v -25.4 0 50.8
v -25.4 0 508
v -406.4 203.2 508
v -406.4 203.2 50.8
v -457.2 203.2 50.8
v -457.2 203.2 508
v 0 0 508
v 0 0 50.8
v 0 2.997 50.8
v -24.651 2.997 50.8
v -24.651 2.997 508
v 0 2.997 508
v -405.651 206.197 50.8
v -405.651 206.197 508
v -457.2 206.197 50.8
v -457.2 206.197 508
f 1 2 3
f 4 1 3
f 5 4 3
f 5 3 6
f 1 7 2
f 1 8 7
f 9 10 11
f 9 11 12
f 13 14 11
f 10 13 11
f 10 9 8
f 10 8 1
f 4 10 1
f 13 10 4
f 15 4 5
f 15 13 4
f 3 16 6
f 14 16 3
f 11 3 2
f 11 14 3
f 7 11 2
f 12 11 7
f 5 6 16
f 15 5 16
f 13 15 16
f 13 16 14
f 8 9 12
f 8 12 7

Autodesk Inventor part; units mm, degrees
ref_plane "YZ Plane" through (0, 0, 0) normal (1, 0, 0) x (0, 1, 0)
ref_plane "XZ Plane" through (0, 0, 0) normal (0, 1, 0) x (-1, 0, 0)
ref_plane "XY Plane" through (0, 0, 0) normal (0, 0, 1) x (1, 0, 0)
sketch "Sketch1" plane through (0, 0, 0) normal (0, 0, 1) x (1, 0, 0)
  line L0 (0, 0) -> (-25.4, 0)
  line L1 (-25.4, 0) -> (-406.4, 203.2)
  line L2 (-406.4, 203.2) -> (-457.2, 203.2)
  line L3 (-457.2, 203.2) -> (-457.2, 206.1972)
  line L4 (-457.2, 206.1972) -> (-405.6507, 206.1972)
  line L5 (-405.6507, 206.1972) -> (-24.6507, 2.9972)
  line L6 (-24.6507, 2.9972) -> (0, 2.9972)
  line L7 (0, 2.9972) -> (0, 0)
  line L8 (-406.4, 203.2) -> (-405.6507, 206.1972) construction
  line L9 (-24.6507, 2.9972) -> (-25.4, 0) construction
  line L10 (0, 0) -> (-457.2, 0) construction
  line L11 (-457.2, 0) -> (-457.2, 206.1972) construction
  line L12 (-457.2, 206.1972) -> (0, 206.1972) construction
  line L13 (0, 206.1972) -> (0, 0) construction
  line L14 (-406.4, 203.2) -> (-449.1958, 32.0169) construction
  dimension "d0" = 2.9972
  dimension "d1" = 2.9972
  dimension "d2" = 381
  dimension "d3" = 203.2
  dimension "d5" = 50.8
  dimension "d6" = 25.4
  dimension "d7" = 151.928
extrude "Extrusion1" add sketch "Sketch1" along normal blind 558.8
sketch "Sketch2" plane through (0, 0, 558.8) normal (0, 0, 1) x (1, 0, 0)
  line L0 (-25.4, 0) -> (0, 0) projected
  line L1 (0, 0) -> (-25.4, 0)
  line L2 (-457.2, 203.2) -> (-406.4, 203.2) projected
  line L3 (-25.4, 0) -> (-406.4, 203.2)
  line L4 (-406.4, 203.2) -> (-457.2, 203.2)
  line L5 (-457.2, 206.1972) -> (-457.2, 203.2) projected
  line L6 (-457.2, 203.2) -> (-457.2, 206.1972)
  line L7 (-24.6507, 2.9972) -> (-405.6507, 206.1972) projected
  line L8 (-457.2, 206.1972) -> (-405.6507, 206.1972)
  line L9 (-405.6507, 206.1972) -> (-24.6507, 2.9972)
  line L10 (-24.6507, 2.9972) -> (0, 2.9972)
  line L11 (0, 2.9972) -> (0, 0)
extrude "Extrusion2" cut sketch "Sketch2" against normal blind 50.8
sketch "Sketch3" plane through (0, 0, 0) normal (0, 0, -1) x (-1, 0, 0)
  line L0 (406.4, 203.2) -> (25.4, 0) projected
  line L1 (0, 0) -> (25.4, 0)
  line L2 (25.4, 0) -> (406.4, 203.2)
  line L3 (457.2, 203.2) -> (406.4, 203.2) projected
  line L4 (406.4, 203.2) -> (457.2, 203.2)
  line L5 (457.2, 206.1972) -> (457.2, 203.2) projected
  line L6 (457.2, 203.2) -> (457.2, 206.1972)
  line L7 (405.6507, 206.1972) -> (457.2, 206.1972) projected
  line L8 (457.2, 206.1972) -> (405.6507, 206.1972)
  line L9 (24.6507, 2.9972) -> (405.6507, 206.1972) projected
  line L10 (405.6507, 206.1972) -> (24.6507, 2.9972)
  line L11 (0, 2.9972) -> (24.6507, 2.9972) projected
  line L12 (24.6507, 2.9972) -> (0, 2.9972)
  line L13 (0, 0) -> (0, 2.9972) projected
  line L14 (0, 2.9972) -> (0, 0)
extrude "Extrusion3" cut sketch "Sketch3" against normal blind 50.8
properties part number "Bottom Lexan Shield for Balls" material "Polycarbonate, Clear"
